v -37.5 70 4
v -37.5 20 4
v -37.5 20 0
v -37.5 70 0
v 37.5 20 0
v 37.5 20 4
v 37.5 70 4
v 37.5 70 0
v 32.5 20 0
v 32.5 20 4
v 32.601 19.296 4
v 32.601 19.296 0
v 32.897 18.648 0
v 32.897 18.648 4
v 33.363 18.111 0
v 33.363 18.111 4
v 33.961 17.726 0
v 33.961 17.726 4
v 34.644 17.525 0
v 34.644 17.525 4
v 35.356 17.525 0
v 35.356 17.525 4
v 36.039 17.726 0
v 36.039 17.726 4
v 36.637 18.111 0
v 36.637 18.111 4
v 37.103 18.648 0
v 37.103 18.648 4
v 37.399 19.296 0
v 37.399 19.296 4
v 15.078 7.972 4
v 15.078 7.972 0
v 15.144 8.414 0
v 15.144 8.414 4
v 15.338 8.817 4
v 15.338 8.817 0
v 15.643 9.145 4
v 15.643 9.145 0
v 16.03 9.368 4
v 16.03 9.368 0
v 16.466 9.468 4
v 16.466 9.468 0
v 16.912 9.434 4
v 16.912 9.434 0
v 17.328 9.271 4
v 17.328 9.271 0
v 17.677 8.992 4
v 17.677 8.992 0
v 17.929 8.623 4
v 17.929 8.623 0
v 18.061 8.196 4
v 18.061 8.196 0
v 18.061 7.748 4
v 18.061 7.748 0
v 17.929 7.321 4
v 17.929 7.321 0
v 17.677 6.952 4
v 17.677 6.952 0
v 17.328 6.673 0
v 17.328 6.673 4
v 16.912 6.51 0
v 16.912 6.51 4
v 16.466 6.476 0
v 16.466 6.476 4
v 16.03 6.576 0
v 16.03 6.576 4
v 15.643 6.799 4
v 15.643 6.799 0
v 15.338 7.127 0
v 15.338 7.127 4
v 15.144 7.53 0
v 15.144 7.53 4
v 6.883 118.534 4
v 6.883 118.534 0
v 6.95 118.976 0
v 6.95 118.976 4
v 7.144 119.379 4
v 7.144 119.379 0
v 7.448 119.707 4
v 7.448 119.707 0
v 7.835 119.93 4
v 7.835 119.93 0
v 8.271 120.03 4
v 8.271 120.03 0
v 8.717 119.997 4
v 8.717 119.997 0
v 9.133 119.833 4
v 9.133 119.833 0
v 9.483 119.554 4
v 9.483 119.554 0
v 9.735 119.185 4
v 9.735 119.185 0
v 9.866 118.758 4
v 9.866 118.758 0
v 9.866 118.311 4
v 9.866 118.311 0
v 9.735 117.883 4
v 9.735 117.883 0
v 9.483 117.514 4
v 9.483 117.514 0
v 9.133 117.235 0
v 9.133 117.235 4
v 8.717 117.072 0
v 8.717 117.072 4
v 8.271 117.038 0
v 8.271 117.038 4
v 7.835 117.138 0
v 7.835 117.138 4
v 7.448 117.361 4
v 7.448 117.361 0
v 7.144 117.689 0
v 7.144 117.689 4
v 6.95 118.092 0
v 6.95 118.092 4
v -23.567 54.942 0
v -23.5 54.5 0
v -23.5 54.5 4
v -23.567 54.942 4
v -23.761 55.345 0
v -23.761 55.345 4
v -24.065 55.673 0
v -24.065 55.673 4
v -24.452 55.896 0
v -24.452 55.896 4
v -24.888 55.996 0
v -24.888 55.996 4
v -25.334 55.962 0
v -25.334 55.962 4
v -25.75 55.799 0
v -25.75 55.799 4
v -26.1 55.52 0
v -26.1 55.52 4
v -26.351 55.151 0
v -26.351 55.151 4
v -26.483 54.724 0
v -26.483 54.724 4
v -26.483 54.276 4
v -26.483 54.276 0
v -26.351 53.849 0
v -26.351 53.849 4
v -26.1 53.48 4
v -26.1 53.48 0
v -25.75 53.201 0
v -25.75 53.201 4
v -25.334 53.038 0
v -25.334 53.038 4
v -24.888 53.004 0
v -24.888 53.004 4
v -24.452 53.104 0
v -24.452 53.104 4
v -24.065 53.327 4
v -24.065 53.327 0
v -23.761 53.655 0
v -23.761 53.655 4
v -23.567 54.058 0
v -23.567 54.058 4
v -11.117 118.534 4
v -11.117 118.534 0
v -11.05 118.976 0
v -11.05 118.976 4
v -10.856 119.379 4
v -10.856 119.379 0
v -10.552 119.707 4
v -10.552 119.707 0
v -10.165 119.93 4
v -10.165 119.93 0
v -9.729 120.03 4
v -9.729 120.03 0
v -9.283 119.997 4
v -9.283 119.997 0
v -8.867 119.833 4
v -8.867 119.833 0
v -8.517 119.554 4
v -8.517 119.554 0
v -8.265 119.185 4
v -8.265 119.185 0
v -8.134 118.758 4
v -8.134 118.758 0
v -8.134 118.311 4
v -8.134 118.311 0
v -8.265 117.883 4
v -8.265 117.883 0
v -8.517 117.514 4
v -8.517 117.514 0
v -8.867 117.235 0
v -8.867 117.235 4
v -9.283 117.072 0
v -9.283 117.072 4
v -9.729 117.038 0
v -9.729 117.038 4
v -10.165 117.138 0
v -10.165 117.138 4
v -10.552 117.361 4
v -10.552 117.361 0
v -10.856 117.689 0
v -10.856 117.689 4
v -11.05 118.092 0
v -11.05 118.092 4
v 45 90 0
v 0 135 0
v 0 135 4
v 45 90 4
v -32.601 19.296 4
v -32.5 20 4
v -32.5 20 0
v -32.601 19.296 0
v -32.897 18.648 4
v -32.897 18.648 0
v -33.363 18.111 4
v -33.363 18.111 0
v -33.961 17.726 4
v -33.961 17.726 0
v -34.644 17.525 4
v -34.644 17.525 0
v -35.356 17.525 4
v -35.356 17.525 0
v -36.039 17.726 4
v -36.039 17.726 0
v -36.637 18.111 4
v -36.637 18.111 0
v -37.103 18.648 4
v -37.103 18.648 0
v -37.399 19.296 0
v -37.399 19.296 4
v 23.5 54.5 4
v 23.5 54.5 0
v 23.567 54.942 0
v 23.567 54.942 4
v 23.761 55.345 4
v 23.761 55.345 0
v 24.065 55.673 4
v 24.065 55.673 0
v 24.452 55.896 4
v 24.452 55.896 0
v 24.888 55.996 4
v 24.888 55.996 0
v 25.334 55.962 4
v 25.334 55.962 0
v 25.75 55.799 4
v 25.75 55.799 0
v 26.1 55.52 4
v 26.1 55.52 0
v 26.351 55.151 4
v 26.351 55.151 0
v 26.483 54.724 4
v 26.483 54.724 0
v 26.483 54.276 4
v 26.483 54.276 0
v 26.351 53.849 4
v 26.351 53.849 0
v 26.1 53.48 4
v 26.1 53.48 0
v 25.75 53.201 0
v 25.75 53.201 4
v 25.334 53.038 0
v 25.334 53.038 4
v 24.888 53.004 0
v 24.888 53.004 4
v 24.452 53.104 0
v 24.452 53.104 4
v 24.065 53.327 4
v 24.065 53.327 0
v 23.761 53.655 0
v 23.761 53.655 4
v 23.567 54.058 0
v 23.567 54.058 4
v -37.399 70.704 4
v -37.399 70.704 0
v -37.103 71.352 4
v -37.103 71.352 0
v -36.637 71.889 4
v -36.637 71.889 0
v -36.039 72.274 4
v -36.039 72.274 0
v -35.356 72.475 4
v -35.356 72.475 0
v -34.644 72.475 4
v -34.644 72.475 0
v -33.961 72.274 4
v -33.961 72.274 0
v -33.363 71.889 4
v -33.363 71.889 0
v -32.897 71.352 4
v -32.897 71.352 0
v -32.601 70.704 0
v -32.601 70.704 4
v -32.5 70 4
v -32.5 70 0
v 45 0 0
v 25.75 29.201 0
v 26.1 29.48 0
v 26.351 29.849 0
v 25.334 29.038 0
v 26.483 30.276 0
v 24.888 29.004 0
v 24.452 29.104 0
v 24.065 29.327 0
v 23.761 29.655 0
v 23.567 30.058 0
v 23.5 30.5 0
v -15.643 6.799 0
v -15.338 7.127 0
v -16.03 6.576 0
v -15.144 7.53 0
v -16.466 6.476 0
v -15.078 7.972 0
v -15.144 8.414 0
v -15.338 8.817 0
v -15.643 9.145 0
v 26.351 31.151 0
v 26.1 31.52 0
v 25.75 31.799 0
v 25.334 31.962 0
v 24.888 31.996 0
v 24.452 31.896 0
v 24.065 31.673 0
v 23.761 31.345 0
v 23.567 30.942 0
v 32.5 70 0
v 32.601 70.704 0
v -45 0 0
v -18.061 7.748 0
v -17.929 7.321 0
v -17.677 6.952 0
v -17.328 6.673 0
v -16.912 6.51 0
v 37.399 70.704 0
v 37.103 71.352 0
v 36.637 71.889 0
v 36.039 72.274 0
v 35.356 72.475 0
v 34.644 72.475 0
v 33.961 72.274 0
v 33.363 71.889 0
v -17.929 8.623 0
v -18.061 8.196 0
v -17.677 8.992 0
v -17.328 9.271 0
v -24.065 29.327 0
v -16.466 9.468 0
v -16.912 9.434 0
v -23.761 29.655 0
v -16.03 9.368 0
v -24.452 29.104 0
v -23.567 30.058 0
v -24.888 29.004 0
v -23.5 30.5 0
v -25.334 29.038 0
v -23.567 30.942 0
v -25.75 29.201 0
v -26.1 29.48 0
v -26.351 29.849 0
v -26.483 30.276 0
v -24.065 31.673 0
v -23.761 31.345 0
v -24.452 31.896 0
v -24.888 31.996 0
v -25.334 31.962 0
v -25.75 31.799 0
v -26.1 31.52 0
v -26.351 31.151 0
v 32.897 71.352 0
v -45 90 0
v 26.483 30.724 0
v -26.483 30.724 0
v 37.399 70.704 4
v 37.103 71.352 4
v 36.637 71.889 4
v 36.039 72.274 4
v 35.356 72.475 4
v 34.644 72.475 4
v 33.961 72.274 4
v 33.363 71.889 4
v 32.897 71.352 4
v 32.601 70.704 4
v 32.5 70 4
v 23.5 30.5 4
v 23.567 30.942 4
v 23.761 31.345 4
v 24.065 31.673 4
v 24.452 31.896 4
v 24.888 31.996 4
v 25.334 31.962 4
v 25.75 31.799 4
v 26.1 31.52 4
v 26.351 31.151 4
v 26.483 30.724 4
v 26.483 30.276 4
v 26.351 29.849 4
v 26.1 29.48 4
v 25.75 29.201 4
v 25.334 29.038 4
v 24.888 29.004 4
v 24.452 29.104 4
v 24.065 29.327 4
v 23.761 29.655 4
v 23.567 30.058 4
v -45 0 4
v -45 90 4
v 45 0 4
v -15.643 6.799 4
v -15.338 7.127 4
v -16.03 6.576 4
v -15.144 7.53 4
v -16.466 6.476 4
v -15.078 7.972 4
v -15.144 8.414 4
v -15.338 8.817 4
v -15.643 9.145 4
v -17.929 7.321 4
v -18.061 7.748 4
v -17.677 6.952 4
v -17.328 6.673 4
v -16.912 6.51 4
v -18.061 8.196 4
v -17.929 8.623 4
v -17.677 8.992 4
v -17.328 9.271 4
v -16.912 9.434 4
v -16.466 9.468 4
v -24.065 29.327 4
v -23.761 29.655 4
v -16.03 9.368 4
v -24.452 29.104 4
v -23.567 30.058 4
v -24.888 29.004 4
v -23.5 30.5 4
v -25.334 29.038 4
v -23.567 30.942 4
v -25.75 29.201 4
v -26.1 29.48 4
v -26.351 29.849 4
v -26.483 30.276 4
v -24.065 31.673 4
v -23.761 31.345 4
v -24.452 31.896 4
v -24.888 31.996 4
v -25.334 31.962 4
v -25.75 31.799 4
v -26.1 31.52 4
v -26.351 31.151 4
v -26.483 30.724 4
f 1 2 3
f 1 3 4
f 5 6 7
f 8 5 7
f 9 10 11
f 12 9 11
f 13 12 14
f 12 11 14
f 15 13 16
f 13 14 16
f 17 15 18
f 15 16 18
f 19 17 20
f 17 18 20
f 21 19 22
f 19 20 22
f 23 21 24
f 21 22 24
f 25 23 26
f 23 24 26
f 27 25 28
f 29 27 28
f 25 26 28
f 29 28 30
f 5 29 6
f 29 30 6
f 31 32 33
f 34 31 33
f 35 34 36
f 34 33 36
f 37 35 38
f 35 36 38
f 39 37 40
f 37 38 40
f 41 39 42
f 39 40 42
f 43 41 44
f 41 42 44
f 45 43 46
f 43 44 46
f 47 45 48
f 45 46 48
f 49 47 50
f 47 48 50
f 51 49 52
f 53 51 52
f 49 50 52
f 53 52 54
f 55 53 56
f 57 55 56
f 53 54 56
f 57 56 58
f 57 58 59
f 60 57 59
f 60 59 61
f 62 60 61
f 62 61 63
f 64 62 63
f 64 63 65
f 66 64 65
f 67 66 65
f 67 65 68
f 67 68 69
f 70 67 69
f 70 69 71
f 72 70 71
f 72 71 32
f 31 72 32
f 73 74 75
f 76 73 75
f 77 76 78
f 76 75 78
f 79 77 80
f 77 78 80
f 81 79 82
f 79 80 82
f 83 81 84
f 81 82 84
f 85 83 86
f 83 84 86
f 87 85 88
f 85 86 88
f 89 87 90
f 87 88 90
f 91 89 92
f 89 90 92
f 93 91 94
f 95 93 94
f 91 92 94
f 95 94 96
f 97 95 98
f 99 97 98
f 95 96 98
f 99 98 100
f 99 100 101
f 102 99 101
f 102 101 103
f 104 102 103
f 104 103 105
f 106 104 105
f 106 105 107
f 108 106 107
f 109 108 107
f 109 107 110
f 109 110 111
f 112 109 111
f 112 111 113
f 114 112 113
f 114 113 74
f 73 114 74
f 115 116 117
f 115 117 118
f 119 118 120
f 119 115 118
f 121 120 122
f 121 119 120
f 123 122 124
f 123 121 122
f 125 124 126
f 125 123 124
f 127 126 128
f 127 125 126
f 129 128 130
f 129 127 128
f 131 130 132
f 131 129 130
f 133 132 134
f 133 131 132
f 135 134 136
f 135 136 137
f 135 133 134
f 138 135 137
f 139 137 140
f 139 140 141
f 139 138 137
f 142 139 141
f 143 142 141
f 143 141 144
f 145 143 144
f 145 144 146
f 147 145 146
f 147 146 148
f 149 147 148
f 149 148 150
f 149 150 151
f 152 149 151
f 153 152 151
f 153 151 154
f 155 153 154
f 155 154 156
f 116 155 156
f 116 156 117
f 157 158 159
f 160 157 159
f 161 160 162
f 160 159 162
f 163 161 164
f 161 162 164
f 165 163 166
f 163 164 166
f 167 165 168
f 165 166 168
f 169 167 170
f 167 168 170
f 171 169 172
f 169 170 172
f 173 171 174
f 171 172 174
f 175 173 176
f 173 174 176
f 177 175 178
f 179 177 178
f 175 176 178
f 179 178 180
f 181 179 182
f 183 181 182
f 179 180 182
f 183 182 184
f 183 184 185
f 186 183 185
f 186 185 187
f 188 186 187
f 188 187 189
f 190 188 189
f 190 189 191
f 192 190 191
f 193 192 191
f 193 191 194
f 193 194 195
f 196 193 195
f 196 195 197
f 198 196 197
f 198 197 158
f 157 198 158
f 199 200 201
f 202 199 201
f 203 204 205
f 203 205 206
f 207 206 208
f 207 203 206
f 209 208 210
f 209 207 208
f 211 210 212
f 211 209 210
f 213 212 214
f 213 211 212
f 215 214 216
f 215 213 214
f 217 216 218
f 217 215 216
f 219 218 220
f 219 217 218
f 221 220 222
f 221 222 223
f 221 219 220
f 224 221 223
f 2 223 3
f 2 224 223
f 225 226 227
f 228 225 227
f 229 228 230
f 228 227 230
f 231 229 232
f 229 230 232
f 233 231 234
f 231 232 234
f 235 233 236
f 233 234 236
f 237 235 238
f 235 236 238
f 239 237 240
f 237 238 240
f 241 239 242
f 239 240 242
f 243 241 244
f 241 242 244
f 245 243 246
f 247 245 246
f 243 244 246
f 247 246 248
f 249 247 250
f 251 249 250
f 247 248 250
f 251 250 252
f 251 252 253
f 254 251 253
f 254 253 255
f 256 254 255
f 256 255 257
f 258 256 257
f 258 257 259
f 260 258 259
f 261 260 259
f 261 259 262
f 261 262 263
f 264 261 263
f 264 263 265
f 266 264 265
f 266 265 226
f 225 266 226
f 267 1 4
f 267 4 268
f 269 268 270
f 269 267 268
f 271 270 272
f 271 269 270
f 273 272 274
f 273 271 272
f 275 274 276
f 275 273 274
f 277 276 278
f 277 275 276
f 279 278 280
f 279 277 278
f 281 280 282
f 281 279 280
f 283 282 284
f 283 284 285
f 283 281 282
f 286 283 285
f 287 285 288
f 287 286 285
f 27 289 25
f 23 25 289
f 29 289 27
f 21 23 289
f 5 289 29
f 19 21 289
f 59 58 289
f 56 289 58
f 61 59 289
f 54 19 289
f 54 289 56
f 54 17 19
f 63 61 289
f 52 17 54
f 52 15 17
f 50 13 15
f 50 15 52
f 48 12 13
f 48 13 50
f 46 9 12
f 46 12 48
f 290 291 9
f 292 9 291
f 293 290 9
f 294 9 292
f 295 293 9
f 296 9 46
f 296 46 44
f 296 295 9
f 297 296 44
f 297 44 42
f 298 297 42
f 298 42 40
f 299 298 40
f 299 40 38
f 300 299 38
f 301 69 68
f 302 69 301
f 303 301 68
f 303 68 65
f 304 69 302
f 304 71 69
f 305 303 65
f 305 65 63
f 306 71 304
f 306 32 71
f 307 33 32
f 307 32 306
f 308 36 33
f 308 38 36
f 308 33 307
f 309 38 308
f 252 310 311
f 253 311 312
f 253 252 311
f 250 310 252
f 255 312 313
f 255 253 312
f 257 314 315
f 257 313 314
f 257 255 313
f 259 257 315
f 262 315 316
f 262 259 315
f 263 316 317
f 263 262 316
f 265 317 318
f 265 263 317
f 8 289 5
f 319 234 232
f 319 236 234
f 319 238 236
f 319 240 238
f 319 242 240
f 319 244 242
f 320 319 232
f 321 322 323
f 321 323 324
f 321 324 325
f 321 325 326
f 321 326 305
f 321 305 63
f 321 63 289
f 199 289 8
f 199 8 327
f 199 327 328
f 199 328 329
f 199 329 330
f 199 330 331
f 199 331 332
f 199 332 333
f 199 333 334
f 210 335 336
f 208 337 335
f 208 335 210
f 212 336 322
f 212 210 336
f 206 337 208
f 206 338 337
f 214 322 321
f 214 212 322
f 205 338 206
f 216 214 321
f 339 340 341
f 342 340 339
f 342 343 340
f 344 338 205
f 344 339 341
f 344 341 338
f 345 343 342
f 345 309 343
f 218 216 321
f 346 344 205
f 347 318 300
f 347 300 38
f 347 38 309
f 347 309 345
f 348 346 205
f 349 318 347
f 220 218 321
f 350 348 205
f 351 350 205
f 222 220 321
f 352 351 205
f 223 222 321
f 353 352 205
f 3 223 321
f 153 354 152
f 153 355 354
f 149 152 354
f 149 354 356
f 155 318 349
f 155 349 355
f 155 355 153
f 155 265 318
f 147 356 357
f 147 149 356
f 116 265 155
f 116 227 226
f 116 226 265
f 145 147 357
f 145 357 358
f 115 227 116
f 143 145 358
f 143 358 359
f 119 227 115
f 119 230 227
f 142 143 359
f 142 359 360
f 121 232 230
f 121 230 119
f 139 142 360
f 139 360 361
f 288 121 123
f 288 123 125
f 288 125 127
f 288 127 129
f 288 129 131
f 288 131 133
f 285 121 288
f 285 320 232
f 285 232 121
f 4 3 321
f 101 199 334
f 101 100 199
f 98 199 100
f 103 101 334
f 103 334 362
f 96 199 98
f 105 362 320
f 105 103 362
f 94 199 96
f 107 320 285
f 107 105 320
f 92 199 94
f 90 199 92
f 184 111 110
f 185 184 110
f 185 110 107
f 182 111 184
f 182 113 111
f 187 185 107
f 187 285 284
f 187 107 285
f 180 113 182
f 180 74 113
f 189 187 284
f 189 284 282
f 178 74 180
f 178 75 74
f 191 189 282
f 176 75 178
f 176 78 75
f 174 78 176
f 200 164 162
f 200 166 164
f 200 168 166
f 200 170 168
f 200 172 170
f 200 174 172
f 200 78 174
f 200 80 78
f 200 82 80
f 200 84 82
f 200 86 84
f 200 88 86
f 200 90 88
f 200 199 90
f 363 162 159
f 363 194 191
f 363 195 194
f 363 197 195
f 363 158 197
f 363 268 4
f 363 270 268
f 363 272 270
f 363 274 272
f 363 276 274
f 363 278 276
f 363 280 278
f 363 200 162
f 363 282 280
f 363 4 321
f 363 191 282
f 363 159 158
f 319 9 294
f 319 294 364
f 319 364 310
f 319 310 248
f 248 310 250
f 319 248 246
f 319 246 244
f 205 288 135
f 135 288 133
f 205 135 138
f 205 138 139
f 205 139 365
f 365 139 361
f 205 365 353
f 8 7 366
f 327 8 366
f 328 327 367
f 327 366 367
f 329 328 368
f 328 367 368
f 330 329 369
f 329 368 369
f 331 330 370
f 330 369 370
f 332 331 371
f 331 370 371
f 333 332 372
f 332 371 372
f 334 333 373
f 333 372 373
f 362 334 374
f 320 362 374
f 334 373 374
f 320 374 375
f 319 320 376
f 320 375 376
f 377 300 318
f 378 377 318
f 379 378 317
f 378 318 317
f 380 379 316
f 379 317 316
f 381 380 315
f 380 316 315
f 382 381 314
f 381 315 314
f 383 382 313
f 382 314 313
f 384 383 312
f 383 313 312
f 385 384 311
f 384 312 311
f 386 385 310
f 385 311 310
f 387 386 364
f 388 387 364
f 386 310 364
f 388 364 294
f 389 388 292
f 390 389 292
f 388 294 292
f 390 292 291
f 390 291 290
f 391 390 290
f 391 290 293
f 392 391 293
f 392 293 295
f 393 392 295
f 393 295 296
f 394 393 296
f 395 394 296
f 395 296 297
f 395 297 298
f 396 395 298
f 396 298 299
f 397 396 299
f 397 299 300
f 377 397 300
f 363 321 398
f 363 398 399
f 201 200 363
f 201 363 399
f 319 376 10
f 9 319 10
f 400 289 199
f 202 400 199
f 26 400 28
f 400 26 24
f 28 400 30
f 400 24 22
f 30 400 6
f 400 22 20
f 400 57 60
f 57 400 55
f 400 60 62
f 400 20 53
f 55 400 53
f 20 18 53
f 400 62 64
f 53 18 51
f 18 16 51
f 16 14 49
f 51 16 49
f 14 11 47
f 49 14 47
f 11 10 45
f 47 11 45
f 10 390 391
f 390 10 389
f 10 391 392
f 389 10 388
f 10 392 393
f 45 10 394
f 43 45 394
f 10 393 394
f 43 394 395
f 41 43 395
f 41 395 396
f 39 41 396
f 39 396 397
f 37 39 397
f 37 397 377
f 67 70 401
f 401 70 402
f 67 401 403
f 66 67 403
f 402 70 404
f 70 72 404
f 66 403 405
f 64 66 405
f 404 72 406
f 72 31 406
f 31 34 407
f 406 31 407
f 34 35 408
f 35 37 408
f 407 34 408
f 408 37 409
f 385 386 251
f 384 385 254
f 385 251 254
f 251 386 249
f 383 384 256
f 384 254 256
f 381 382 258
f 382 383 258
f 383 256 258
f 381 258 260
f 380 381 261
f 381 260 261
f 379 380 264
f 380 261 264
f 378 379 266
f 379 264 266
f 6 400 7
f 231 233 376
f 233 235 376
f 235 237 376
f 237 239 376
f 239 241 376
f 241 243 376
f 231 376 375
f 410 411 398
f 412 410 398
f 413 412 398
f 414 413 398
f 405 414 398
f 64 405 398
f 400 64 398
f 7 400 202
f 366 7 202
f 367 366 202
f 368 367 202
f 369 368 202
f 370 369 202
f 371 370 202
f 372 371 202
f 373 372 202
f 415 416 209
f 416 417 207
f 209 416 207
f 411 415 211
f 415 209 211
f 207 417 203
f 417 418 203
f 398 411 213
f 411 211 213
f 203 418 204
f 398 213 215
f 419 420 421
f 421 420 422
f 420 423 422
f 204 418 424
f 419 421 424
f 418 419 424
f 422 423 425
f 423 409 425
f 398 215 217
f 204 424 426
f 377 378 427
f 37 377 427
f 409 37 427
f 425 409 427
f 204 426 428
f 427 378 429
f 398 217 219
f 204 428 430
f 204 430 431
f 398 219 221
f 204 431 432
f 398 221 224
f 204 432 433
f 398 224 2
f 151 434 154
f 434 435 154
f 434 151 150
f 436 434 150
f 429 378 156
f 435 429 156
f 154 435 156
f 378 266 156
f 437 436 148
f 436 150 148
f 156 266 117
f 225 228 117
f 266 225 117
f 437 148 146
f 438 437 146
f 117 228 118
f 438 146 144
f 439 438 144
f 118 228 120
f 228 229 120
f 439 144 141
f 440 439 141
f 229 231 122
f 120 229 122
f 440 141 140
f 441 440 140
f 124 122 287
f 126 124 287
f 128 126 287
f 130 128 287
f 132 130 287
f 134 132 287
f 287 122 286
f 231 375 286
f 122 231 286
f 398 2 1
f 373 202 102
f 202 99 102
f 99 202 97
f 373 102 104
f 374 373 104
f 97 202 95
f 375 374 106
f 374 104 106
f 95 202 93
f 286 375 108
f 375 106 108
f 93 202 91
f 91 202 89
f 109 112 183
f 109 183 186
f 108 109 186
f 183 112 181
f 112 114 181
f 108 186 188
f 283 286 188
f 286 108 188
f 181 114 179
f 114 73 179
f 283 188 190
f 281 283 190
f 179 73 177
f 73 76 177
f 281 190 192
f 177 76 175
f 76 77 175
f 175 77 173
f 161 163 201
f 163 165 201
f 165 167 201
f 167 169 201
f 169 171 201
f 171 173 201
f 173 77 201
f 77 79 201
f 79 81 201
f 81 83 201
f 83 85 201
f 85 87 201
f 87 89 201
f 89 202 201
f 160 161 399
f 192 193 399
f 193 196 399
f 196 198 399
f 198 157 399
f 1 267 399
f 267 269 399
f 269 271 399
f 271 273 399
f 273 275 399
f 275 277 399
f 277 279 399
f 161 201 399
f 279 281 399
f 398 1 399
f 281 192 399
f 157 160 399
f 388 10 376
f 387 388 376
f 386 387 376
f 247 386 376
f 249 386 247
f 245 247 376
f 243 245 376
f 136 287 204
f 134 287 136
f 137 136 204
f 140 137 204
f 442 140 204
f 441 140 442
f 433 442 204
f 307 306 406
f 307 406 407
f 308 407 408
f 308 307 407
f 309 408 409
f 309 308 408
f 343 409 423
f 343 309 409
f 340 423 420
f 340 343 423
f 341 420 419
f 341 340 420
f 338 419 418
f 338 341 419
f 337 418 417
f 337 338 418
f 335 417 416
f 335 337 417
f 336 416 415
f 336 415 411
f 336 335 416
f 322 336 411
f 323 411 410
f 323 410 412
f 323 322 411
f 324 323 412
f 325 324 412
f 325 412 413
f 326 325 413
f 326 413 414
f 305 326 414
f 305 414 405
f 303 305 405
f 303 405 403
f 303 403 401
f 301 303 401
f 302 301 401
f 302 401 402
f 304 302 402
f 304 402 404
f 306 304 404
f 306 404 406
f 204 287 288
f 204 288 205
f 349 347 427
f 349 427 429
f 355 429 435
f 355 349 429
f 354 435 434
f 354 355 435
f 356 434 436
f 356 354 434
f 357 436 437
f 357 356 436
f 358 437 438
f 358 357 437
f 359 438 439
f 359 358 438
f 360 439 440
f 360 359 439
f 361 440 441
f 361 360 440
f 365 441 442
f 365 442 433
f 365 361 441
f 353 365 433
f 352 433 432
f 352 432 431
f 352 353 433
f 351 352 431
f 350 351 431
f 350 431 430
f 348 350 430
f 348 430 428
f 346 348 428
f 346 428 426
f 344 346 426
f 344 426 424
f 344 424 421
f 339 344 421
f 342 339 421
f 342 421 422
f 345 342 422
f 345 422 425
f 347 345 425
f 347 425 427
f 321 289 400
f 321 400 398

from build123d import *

# Parameters (mm, degrees)
F0_W     = 45
F0_H     = 135
F1_DEPTH = 4
F2_SIZE  = 44.99999
F5_DEPTH = 39.1207225621
F7_D     = 3
F9_D     = 3
F11_D    = 3
F14_D    = 3


# Not quite as in the source:
# - a fillet or chamfer is up to 0.001 mm smaller than in the source, because OpenCascade refuses the exact size


with BuildPart() as f1:
    # F0 (on Top) → F1 (new body)
    with BuildSketch(Plane.XY):
        with Locations((22.5, 67.5)):
            Rectangle(F0_W, F0_H)
    extrude(amount=F1_DEPTH)

    # F2 (size 45 in the source; OpenCascade refuses exactly that, so slightly less here)
    f2_edges = [f1.edges().sort_by_distance(p)[0] for p in [
        (45, 135, 2),
    ]]
    chamfer(f2_edges, length=F2_SIZE)

    # F4 (on face) → F5 (cut)
    with BuildSketch(Plane.XY.offset(4)):
        with BuildLine():
            ThreePointArc((32.5, 20), (35, 17.5), (37.5, 20))
            Line((37.5, 20), (37.5, 70))
            ThreePointArc((37.5, 70), (35, 72.5), (32.5, 70))
            Line((32.5, 70), (32.5, 20))
        make_face()
    extrude(amount=-F5_DEPTH, mode=Mode.SUBTRACT)

    # F7 (through all)
    with Locations(Plane.XY.offset(4)):
        with Locations((16.5778252002, 7.9720381196)):
            Hole(F7_D / 2)

    # F9 (through all)
    with Locations(Plane.XY.offset(4)):
        with Locations((25, 30.5)):
            Hole(F9_D / 2)

    # F11 (through all)
    with Locations(Plane.XY.offset(4)):
        with Locations((25, 54.5)):
            Hole(F11_D / 2)

    # F12: F1 across plane


with BuildPart() as f1_1:
    add(f1.part)
    add(f1.part.mirror(Plane.YZ))

    # F14 (through all)
    with Locations(Plane.XY.offset(4)):
        with Locations((-9.6168344989, 118.5341477394), (8.3831655011, 118.5341477394)):
            Hole(F14_D / 2)


solid = f1_1.part
